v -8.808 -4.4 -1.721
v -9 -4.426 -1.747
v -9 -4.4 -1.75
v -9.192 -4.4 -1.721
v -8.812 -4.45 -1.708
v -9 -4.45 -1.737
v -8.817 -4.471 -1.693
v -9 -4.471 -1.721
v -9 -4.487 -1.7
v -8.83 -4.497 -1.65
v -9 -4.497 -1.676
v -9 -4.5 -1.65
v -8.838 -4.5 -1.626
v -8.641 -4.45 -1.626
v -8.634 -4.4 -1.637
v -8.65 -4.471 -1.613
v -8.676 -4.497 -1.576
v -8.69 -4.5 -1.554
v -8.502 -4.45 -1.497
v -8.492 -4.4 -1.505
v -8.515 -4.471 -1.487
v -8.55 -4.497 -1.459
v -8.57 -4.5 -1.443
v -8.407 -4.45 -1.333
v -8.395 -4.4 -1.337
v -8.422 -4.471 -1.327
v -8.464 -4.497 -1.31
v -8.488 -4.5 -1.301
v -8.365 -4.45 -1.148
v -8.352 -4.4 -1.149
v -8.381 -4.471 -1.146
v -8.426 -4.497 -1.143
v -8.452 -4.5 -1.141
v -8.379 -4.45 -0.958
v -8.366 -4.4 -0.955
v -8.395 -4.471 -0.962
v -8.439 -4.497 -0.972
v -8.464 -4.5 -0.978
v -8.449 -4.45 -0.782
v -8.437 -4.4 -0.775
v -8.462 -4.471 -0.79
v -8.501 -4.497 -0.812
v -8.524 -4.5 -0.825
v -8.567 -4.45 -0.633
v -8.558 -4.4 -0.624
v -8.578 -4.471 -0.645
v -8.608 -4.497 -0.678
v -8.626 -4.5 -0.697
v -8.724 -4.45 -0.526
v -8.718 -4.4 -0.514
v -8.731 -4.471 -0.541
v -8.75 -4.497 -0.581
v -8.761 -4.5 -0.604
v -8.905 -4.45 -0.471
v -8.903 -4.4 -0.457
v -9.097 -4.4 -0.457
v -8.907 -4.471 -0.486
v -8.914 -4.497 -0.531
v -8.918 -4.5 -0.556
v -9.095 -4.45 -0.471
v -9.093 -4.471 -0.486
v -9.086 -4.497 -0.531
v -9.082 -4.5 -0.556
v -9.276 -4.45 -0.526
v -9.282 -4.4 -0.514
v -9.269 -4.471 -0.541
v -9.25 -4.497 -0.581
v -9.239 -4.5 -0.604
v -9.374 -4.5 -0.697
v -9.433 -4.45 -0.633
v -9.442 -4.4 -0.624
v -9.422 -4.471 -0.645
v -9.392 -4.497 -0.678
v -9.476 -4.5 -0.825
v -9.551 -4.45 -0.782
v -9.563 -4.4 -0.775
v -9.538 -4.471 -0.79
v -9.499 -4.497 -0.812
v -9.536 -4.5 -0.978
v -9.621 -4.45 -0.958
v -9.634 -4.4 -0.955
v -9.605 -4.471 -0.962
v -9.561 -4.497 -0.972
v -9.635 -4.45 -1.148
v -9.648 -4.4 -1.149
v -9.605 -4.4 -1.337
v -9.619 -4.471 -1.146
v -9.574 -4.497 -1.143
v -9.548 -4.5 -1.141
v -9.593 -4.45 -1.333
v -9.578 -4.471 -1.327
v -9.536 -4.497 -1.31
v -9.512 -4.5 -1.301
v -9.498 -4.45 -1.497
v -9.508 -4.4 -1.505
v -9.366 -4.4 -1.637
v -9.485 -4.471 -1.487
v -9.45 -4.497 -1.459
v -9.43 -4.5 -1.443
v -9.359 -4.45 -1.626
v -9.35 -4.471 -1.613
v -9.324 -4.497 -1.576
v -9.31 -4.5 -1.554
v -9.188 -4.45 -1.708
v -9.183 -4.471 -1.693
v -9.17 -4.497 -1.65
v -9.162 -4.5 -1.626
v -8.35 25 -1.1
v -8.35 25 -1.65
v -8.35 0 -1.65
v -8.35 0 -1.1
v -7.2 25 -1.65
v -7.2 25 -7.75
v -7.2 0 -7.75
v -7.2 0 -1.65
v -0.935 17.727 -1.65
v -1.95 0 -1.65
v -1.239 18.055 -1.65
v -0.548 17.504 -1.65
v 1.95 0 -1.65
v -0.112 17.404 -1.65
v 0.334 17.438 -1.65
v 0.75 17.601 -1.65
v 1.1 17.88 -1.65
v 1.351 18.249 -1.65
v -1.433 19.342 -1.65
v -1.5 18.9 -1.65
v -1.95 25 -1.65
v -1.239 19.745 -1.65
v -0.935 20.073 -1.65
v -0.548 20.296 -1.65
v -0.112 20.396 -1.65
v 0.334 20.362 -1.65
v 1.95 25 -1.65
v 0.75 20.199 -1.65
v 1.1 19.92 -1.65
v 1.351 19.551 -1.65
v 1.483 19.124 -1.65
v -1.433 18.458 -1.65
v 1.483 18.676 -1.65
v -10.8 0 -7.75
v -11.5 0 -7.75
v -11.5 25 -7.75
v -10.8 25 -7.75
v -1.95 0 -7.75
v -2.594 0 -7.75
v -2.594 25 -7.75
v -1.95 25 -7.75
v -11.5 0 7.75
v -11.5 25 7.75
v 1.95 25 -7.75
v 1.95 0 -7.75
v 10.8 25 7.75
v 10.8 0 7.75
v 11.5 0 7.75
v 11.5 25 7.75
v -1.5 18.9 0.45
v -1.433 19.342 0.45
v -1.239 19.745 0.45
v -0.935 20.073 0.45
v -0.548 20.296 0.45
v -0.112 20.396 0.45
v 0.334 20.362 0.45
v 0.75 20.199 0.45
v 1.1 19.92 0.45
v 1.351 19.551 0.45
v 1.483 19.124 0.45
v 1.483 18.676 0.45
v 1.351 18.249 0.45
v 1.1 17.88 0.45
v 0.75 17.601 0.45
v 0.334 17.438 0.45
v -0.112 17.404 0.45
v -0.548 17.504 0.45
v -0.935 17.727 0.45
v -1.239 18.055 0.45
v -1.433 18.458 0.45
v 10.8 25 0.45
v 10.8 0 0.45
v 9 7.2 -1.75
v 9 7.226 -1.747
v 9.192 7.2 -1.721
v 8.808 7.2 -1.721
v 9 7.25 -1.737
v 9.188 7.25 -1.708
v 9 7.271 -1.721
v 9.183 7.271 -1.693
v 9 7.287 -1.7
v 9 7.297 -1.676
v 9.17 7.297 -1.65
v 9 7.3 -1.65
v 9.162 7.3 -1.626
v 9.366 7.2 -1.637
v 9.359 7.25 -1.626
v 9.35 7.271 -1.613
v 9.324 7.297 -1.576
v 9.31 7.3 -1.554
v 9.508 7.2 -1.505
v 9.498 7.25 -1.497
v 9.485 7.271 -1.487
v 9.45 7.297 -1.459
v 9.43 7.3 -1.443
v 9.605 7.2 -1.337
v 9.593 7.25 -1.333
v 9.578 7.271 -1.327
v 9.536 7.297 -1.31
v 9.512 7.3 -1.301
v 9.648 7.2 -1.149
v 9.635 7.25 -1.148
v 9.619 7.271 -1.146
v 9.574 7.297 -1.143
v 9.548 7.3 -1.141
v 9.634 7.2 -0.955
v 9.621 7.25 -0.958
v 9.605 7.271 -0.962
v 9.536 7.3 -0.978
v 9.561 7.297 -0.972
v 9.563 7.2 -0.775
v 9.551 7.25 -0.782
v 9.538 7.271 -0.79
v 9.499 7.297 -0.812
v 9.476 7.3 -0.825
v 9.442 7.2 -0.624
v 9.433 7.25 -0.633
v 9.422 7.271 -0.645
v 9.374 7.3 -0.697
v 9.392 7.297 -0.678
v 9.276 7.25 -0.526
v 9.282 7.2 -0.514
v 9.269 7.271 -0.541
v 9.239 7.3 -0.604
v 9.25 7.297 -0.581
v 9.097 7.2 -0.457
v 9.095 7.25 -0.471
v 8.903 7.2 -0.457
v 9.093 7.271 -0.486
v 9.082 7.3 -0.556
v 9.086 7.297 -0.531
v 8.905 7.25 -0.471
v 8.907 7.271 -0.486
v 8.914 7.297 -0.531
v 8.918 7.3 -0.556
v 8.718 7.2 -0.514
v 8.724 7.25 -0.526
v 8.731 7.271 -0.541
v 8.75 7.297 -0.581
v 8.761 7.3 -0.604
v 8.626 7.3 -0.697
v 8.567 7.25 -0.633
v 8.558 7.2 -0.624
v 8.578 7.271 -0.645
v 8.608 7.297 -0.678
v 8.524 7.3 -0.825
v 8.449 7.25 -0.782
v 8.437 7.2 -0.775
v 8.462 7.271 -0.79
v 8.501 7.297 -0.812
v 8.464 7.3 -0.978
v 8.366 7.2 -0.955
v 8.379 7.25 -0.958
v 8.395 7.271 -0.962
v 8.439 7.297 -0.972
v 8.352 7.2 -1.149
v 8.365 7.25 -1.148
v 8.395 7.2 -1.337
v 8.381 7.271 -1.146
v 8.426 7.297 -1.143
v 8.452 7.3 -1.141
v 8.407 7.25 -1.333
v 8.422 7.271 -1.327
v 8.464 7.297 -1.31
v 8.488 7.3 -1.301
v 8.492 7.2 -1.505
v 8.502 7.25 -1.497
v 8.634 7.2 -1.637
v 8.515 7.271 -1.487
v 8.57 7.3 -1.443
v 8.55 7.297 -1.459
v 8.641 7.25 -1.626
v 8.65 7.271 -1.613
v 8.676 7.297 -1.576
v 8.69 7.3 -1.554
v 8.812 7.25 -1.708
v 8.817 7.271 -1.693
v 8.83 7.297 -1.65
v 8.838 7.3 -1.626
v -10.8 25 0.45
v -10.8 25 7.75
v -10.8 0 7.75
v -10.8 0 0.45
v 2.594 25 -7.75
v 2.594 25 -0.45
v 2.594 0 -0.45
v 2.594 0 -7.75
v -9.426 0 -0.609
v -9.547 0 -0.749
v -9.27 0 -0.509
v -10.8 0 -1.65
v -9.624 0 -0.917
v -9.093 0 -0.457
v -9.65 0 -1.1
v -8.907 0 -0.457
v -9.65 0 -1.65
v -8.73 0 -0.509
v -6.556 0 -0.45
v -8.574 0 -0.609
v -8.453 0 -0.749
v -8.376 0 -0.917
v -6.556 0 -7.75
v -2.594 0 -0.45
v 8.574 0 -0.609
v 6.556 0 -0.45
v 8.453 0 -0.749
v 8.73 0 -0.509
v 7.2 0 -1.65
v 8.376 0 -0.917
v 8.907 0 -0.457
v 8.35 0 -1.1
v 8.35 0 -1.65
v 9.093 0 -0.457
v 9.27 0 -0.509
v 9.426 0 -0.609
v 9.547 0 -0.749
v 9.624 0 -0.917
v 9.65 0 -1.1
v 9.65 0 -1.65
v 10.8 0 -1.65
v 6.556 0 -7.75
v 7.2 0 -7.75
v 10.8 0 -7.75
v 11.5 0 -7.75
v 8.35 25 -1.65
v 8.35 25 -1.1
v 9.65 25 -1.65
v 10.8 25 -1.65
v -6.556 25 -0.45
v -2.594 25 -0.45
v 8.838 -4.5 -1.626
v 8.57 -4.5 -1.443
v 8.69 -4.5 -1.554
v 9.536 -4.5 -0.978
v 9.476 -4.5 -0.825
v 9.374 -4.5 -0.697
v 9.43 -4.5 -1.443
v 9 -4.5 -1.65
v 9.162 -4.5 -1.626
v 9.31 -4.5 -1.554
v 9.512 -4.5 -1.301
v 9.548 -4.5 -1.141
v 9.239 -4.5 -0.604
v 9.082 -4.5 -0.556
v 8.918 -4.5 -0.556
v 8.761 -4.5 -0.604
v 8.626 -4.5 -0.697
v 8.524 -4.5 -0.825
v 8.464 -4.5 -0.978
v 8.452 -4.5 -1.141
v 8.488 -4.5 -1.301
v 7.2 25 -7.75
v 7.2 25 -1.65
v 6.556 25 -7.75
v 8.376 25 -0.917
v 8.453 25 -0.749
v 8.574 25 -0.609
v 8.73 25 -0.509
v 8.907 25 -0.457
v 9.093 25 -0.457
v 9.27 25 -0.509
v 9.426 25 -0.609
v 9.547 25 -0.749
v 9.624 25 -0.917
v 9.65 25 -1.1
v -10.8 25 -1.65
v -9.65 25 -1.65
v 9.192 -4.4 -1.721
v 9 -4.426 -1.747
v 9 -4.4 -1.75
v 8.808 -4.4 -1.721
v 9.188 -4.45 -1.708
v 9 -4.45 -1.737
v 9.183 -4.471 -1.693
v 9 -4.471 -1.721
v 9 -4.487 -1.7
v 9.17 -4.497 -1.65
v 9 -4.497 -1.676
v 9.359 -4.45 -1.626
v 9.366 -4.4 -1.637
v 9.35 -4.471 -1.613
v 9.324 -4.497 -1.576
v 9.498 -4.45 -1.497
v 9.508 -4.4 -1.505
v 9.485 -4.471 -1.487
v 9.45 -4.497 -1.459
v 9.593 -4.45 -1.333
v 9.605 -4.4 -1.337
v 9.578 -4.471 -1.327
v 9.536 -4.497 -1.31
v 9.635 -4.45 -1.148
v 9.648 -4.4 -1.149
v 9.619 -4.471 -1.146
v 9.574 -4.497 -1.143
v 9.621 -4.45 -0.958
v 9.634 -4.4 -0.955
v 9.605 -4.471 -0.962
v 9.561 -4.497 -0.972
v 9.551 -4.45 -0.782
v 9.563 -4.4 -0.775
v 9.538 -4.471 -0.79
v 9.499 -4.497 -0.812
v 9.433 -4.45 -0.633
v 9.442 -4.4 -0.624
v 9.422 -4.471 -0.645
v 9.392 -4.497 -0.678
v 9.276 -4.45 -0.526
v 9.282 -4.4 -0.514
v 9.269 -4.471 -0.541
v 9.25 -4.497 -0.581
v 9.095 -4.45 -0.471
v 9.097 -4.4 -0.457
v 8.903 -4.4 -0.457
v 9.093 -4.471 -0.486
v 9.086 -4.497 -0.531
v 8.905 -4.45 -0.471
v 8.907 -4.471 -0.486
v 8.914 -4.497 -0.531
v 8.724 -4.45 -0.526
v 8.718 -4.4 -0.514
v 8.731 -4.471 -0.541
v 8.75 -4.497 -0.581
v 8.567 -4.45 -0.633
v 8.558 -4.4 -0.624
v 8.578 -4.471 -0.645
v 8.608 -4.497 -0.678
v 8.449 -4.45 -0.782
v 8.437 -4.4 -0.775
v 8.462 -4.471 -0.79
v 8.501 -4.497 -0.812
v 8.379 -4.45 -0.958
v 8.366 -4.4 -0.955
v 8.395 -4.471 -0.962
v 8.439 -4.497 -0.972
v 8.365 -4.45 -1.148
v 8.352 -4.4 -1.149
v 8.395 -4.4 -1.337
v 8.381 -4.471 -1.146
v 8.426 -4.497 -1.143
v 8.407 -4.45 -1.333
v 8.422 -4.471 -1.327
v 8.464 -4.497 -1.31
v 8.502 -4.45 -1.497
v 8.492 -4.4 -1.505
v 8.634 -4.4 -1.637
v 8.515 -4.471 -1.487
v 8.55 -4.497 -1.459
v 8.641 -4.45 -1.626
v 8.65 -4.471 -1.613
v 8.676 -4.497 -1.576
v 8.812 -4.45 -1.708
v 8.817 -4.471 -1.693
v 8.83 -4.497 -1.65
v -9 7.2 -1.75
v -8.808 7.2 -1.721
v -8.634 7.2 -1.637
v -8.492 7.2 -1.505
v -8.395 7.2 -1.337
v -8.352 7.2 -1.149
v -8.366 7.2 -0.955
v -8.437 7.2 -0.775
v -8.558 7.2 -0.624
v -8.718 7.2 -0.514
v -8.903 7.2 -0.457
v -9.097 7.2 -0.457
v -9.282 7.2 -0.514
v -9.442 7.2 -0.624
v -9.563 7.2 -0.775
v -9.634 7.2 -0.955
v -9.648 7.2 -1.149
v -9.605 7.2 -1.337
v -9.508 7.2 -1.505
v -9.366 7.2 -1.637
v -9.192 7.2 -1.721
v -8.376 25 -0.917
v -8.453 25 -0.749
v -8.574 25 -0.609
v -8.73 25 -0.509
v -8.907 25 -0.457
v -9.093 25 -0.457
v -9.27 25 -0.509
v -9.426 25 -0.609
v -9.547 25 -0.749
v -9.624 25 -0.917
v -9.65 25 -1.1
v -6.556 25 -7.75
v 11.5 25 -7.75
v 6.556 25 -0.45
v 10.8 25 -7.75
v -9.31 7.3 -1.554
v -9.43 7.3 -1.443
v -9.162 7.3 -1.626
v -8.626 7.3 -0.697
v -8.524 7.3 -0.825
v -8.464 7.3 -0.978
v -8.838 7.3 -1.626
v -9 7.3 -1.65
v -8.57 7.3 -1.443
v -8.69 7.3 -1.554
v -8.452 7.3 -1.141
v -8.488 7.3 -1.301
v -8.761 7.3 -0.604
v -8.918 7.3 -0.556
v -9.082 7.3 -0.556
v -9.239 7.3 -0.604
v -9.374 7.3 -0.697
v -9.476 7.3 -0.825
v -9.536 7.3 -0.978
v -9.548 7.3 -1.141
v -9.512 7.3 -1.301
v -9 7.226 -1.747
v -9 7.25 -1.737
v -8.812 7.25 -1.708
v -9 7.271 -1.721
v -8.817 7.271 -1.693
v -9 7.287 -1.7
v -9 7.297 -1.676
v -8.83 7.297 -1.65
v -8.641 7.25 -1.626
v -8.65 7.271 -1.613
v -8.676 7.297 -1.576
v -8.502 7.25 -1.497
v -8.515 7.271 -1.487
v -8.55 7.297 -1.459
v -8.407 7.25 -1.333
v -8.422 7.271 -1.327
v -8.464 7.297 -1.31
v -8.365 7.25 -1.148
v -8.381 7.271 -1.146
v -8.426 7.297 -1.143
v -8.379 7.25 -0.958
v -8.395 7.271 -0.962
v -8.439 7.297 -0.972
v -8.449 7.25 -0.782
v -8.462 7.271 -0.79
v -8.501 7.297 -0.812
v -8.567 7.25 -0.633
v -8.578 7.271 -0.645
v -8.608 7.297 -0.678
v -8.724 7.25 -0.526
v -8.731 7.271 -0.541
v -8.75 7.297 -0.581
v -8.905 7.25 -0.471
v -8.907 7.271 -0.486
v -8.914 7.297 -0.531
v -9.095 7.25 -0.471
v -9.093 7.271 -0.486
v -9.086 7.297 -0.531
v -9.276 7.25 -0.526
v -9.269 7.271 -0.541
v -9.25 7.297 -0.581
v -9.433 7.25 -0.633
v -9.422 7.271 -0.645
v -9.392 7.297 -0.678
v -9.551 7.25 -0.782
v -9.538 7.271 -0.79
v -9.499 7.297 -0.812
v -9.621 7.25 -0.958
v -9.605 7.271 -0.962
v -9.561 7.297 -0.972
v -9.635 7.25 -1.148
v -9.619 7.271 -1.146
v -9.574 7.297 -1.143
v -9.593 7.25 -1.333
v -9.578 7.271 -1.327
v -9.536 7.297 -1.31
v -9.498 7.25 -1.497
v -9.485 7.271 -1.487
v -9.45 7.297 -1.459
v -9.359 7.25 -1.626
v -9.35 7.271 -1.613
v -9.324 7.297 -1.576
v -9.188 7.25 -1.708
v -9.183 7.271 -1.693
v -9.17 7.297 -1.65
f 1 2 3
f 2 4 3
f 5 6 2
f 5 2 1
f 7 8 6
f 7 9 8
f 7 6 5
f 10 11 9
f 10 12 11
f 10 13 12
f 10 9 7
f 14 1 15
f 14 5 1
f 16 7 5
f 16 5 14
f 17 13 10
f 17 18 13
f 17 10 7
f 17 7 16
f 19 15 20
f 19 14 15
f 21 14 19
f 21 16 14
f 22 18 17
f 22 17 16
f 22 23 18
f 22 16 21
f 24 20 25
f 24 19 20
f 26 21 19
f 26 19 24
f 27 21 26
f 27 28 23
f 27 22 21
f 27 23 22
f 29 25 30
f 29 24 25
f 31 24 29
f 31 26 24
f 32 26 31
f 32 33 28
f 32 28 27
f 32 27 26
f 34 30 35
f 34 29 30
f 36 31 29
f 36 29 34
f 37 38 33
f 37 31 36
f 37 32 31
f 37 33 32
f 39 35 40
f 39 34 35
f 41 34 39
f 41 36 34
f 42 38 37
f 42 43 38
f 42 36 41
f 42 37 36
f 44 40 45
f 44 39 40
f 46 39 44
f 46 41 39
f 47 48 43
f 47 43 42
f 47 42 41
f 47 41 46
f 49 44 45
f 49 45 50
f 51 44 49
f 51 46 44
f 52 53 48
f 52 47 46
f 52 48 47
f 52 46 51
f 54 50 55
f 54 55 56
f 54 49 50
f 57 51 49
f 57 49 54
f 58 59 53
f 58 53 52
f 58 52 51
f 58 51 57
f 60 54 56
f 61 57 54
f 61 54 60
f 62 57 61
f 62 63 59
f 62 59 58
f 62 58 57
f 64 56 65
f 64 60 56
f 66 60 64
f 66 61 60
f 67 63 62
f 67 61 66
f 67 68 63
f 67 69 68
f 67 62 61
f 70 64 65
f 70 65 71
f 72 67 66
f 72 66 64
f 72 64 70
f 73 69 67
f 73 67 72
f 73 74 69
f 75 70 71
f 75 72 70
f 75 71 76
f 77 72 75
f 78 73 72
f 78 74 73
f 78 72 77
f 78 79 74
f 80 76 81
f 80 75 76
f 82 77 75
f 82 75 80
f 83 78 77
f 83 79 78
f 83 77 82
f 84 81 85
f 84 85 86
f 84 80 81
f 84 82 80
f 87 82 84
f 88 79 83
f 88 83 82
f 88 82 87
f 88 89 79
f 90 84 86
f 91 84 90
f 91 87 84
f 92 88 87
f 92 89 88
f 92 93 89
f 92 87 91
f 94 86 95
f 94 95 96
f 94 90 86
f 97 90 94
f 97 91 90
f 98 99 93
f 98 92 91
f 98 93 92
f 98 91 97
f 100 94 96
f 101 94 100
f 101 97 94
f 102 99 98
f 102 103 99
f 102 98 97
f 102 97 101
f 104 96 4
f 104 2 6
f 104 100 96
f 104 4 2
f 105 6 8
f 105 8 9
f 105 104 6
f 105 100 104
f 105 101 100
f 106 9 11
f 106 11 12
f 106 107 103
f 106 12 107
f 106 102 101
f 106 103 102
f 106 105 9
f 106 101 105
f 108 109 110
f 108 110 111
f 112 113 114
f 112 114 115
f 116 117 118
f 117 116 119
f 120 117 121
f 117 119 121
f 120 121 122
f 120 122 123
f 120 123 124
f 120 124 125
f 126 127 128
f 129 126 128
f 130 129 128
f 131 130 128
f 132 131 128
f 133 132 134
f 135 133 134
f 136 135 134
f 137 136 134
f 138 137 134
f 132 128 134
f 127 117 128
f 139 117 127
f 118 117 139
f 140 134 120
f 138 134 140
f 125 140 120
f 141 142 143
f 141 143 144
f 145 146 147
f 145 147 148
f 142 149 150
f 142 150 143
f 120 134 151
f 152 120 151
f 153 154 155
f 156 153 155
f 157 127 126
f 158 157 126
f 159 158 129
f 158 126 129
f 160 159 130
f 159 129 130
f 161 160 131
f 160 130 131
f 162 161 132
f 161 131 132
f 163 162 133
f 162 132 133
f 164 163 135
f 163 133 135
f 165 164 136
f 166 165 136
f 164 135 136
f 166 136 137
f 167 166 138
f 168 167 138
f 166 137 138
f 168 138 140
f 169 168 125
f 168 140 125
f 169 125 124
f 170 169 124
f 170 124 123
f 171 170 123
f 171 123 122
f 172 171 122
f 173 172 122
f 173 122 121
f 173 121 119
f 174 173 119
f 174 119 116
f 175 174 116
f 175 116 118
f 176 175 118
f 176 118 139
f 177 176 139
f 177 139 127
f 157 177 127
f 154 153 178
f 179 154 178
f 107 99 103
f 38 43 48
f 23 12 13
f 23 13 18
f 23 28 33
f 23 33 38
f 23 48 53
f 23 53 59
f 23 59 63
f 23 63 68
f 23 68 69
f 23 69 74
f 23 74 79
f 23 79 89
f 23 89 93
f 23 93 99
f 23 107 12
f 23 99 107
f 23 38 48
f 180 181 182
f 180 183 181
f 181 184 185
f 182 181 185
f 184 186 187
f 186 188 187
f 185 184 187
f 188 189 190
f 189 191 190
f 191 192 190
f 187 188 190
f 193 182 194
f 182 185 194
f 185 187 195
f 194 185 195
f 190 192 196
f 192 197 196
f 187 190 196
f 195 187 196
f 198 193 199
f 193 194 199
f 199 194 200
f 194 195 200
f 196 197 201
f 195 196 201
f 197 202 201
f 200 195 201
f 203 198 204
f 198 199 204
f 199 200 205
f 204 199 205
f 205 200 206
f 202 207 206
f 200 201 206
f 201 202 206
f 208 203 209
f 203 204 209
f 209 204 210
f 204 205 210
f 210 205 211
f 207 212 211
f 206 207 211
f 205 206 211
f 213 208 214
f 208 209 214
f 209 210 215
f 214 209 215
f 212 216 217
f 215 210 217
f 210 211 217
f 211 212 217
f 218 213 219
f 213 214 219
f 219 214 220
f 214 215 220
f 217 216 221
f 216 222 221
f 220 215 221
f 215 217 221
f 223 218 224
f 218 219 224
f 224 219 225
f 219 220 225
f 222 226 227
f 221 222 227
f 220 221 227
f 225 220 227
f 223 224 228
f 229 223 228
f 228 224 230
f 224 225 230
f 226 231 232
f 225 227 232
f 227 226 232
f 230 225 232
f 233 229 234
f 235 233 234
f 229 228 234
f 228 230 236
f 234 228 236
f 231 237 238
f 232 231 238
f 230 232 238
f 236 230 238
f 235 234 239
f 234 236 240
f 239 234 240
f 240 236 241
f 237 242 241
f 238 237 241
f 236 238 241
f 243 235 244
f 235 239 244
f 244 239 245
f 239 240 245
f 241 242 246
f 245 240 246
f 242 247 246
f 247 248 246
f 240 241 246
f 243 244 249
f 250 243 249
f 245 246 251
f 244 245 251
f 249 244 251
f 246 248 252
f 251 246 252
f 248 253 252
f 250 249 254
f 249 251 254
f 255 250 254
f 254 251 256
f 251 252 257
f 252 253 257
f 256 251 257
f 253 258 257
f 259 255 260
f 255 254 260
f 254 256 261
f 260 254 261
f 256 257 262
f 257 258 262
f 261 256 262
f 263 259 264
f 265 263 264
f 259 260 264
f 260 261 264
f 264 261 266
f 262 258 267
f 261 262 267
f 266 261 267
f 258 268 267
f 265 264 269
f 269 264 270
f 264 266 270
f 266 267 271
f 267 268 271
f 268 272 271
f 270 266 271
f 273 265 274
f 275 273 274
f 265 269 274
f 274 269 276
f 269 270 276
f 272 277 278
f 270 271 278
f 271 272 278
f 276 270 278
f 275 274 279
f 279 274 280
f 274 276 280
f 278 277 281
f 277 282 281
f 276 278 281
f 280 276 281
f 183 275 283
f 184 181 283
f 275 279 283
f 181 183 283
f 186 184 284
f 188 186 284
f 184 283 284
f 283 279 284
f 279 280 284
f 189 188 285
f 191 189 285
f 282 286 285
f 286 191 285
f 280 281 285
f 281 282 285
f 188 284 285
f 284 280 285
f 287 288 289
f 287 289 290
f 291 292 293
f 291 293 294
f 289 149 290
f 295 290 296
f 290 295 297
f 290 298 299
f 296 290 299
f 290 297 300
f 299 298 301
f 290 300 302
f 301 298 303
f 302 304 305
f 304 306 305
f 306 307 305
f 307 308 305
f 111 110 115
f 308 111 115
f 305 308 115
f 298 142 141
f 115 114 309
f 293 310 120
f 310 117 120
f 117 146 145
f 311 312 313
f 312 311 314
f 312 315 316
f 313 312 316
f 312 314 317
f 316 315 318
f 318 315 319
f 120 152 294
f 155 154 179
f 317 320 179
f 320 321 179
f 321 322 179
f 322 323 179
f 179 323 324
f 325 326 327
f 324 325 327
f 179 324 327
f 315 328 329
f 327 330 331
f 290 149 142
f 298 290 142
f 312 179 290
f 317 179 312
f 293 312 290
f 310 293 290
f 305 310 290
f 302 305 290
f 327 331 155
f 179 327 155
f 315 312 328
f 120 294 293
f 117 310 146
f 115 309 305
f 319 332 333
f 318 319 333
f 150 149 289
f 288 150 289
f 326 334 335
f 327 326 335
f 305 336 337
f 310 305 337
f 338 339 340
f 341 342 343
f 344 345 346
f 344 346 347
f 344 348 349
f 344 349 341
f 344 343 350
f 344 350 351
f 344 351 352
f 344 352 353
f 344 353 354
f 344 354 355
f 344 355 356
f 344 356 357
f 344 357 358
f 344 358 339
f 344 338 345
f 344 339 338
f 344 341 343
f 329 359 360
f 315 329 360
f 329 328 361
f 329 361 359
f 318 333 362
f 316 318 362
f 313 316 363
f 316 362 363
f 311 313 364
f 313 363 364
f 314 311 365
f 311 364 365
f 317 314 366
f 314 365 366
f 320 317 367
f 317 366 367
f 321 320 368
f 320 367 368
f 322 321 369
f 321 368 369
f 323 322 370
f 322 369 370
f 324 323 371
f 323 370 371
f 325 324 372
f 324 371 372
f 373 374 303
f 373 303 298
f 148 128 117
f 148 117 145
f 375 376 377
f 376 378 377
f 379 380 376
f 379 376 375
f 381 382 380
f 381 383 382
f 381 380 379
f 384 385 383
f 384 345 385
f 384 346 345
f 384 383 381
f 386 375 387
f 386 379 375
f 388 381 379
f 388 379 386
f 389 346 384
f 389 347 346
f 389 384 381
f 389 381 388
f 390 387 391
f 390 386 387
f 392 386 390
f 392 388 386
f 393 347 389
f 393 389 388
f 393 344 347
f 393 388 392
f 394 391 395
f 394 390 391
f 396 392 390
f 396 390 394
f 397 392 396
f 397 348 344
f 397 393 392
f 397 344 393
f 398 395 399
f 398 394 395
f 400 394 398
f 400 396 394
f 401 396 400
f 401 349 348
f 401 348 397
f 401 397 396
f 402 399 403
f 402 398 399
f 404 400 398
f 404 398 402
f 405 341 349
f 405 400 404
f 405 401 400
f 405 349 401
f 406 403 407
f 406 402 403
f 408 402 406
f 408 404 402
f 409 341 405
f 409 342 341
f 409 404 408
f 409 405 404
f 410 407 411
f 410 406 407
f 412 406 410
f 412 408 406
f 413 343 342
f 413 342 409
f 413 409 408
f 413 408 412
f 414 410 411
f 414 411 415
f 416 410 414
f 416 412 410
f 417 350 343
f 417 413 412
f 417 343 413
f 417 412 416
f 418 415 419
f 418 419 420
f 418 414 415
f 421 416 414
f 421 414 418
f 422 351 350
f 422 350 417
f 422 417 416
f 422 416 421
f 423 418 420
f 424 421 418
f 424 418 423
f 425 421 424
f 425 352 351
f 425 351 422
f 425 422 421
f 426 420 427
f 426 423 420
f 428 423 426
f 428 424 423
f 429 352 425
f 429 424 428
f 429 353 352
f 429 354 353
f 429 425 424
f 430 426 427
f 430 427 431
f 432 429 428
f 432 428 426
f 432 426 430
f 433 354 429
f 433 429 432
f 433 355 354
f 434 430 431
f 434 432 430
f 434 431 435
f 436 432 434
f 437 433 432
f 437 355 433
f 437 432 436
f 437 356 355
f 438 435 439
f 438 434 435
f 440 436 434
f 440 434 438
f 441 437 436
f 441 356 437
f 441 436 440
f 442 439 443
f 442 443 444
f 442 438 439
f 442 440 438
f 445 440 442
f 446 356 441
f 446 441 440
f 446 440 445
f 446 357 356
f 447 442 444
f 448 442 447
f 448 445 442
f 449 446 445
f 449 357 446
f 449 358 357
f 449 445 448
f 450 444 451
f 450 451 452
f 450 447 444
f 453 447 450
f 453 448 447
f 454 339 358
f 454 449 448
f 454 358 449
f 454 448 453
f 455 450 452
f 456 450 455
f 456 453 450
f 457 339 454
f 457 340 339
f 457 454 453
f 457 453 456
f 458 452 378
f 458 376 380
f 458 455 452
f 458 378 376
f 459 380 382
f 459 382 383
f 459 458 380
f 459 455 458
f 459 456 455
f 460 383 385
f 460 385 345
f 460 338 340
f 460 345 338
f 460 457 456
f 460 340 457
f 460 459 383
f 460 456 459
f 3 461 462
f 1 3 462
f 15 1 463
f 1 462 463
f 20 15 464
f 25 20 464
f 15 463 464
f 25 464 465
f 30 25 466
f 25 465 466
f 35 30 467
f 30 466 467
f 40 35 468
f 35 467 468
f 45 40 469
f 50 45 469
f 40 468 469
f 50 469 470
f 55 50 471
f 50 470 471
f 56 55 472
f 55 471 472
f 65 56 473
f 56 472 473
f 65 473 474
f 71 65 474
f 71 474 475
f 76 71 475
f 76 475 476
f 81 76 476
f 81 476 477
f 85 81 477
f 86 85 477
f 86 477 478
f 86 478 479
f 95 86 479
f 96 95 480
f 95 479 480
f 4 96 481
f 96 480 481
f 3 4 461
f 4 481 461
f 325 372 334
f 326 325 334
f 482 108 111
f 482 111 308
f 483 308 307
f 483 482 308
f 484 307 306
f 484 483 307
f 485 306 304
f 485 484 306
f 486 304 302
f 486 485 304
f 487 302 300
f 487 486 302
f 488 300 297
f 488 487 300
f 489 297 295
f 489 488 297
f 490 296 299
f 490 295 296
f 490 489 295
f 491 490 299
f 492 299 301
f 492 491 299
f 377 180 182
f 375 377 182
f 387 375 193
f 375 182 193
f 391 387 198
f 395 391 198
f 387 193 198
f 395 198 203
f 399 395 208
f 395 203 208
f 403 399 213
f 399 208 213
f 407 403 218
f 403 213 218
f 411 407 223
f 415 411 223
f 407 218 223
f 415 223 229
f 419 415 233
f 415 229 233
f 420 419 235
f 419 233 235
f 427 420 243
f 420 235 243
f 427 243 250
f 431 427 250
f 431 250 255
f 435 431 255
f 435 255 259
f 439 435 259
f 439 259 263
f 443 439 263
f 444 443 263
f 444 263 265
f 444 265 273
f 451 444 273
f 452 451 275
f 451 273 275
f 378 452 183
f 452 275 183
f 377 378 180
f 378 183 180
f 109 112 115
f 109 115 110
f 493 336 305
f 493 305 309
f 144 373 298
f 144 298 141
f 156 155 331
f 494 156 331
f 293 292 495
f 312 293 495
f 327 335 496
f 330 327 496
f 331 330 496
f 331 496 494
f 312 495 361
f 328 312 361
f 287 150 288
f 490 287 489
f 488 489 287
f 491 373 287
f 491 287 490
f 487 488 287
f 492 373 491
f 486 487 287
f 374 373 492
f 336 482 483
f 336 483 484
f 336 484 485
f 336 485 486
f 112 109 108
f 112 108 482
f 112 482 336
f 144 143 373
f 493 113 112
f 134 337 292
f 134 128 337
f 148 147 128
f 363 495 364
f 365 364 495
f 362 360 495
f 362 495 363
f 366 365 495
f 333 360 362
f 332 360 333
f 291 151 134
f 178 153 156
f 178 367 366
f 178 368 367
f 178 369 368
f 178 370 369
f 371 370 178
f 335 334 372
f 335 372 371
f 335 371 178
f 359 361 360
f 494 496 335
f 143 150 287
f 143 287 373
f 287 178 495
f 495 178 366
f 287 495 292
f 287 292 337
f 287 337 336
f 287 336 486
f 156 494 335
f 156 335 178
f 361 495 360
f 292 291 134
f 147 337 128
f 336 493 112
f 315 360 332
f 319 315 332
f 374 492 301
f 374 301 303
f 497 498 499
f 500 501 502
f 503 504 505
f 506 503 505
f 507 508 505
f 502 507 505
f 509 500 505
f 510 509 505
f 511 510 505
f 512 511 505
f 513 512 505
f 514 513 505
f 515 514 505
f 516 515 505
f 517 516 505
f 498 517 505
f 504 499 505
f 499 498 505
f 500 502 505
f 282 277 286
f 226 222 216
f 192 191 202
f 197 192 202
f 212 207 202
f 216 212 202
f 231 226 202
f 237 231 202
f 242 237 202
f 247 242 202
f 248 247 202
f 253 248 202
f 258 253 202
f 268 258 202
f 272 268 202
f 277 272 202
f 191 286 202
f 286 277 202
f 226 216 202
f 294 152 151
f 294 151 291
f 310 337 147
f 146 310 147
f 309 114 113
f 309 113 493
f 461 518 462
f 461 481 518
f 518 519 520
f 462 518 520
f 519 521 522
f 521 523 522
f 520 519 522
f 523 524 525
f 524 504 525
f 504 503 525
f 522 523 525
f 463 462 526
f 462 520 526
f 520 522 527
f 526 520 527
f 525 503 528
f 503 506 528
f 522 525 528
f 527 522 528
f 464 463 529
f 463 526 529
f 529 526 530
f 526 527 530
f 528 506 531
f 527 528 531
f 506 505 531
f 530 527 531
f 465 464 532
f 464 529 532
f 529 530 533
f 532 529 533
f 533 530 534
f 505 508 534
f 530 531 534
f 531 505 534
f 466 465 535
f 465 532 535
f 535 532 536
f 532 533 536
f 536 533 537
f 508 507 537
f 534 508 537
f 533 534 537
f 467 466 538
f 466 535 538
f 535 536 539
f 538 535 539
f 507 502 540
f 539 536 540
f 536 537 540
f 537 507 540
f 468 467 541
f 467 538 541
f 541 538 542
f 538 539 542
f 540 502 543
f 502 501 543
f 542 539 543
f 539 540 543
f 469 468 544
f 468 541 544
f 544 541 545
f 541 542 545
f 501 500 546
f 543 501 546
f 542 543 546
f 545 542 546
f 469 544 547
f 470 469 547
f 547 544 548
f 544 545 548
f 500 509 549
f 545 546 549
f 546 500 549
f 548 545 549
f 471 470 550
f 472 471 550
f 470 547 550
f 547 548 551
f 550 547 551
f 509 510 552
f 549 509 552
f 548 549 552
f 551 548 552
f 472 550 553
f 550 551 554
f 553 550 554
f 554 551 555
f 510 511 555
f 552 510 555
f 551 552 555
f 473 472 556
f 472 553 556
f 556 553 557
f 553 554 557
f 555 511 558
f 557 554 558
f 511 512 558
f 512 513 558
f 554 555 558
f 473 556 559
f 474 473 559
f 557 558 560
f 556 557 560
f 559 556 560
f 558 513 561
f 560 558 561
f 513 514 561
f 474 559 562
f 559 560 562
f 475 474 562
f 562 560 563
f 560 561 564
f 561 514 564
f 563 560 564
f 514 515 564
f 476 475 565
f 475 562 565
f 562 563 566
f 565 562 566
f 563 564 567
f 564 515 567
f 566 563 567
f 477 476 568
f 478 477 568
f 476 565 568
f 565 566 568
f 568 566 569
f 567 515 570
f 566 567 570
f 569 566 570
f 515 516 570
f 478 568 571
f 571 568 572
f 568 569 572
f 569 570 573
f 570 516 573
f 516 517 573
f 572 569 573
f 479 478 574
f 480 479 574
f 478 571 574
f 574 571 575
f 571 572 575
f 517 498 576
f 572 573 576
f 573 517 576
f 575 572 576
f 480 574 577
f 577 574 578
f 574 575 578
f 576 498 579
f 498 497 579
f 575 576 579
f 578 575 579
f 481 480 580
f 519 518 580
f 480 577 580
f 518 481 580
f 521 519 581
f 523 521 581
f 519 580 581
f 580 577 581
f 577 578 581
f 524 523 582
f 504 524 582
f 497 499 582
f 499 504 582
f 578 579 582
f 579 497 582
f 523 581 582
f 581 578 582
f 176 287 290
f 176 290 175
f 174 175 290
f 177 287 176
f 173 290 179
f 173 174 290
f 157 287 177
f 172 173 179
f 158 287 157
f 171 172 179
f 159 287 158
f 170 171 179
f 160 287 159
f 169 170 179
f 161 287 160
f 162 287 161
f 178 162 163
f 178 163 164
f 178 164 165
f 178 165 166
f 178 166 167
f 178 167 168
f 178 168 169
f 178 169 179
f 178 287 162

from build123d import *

# Parameters (mm, degrees)
SKETCH1_W                  = 23
SKETCH1_H                  = 15.5
HEIGHT_DEPTH               = 25
SKETCH2_W                  = 3.9
SKETCH2_H                  = 6.1
SKETCH2_W_2                = 3.961996068
SKETCH2_H_2                = 7.3
SKETCH2_W_3                = 21.6
PROFILE_CUT_DEPTH          = 29.588677829
BOSS_EXTRUDE2_DEPTH        = 4.5
BOSS_EXTRUDE2_DEPTH_BACK   = 7.3
SKETCH3_R                  = 0.65
BOSS_EXTRUDE2_2_DEPTH      = 4.5
BOSS_EXTRUDE2_2_DEPTH_BACK = 7.3
FILLET1_R                  = 0.1
FILLET2_R                  = 0.1
SKETCH4_R                  = 1.5
CUT_EXTRUDE2_DEPTH         = 30.079374134


with BuildPart() as part:
    # Sketch1 → Height (new body)
    with BuildSketch(Plane(origin=(0, 0, 0), x_dir=(1, 0, 0), z_dir=(0, 1, 0))):
        Rectangle(SKETCH1_W, SKETCH1_H)
    extrude(amount=HEIGHT_DEPTH)

    # Sketch2 → Profile Cut (cut, through all)
    with BuildSketch(Plane(origin=(0, 25, 0), x_dir=(1, 0, 0), z_dir=(0, 1, 0))):
        with Locations((0, 4.7)):
            Rectangle(SKETCH2_W, SKETCH2_H)
        with BuildLine():
            Line((-10.8, 7.75), (-7.2, 7.75))
            Line((-7.2, 7.75), (-7.2, 1.65))
            Line((-7.2, 1.65), (-8.35, 1.65))
            Line((-8.35, 1.65), (-8.35, 1.1))
            ThreePointArc((-8.35, 1.1), (-9, 0.45), (-9.65, 1.1))
            Line((-9.65, 1.1), (-9.65, 1.65))
            Line((-9.65, 1.65), (-10.8, 1.65))
            Line((-10.8, 1.65), (-10.8, 7.75))
        make_face()
        with BuildLine():
            Line((10.8, 7.75), (7.2, 7.75))
            Line((7.2, 7.75), (7.2, 1.65))
            Line((7.2, 1.65), (8.35, 1.65))
            Line((8.35, 1.65), (8.35, 1.1))
            ThreePointArc((8.35, 1.1), (9, 0.45), (9.65, 1.1))
            Line((9.65, 1.1), (9.65, 1.65))
            Line((9.65, 1.65), (10.8, 1.65))
            Line((10.8, 1.65), (10.8, 7.75))
        make_face()
        with Locations((-4.575, 4.1)):
            Rectangle(SKETCH2_W_2, SKETCH2_H_2)
        with Locations((4.575, 4.1)):
            Rectangle(SKETCH2_W_2, SKETCH2_H_2)
        with Locations((0, -4.1)):
            Rectangle(SKETCH2_W_3, SKETCH2_H_2)
    extrude(amount=-PROFILE_CUT_DEPTH, mode=Mode.SUBTRACT)

    # Sketch4 → Cut-Extrude2 (cut, through all)
    with BuildSketch(Plane(origin=(0, 0, -1.65), x_dir=(-1, 0, 0), z_dir=(0, 0, -1))):
        with Locations((0, 18.9)):
            Circle(SKETCH4_R)
    extrude(amount=-CUT_EXTRUDE2_DEPTH, mode=Mode.SUBTRACT)


with BuildPart() as body_2:
    # Sketch3 → Boss-Extrude2 (new, two sides: drawn at the far end of the back side and taken through both)
    with BuildSketch(Plane.XZ.offset(-BOSS_EXTRUDE2_DEPTH_BACK)):
        with Locations(Location((-9, -1.1, 0), (0, 0, 270))):
            Circle(SKETCH3_R)
    extrude(amount=BOSS_EXTRUDE2_DEPTH + BOSS_EXTRUDE2_DEPTH_BACK)

    # Fillet2
    fillet2_edges = [body_2.edges().sort_by_distance(p)[0] for p in [
        (-9, -4.5, -0.45),
        (-9, 7.3, -0.45),
    ]]
    fillet(fillet2_edges, radius=FILLET2_R)


with BuildPart() as body_3:
    # Sketch3 → Boss-Extrude2 2 (new, two sides: drawn at the far end of the back side and taken through both)
    with BuildSketch(Plane.XZ.offset(-BOSS_EXTRUDE2_2_DEPTH_BACK)):
        with Locations(Location((9, -1.1, 0), (0, 0, 270))):
            Circle(SKETCH3_R)
    extrude(amount=BOSS_EXTRUDE2_2_DEPTH + BOSS_EXTRUDE2_2_DEPTH_BACK)

    # Fillet1
    fillet1_edges = [body_3.edges().sort_by_distance(p)[0] for p in [
        (9, -4.5, -0.45),
        (9, 7.3, -0.45),
    ]]
    fillet(fillet1_edges, radius=FILLET1_R)


solid = Compound([part.part, body_2.part, body_3.part])
